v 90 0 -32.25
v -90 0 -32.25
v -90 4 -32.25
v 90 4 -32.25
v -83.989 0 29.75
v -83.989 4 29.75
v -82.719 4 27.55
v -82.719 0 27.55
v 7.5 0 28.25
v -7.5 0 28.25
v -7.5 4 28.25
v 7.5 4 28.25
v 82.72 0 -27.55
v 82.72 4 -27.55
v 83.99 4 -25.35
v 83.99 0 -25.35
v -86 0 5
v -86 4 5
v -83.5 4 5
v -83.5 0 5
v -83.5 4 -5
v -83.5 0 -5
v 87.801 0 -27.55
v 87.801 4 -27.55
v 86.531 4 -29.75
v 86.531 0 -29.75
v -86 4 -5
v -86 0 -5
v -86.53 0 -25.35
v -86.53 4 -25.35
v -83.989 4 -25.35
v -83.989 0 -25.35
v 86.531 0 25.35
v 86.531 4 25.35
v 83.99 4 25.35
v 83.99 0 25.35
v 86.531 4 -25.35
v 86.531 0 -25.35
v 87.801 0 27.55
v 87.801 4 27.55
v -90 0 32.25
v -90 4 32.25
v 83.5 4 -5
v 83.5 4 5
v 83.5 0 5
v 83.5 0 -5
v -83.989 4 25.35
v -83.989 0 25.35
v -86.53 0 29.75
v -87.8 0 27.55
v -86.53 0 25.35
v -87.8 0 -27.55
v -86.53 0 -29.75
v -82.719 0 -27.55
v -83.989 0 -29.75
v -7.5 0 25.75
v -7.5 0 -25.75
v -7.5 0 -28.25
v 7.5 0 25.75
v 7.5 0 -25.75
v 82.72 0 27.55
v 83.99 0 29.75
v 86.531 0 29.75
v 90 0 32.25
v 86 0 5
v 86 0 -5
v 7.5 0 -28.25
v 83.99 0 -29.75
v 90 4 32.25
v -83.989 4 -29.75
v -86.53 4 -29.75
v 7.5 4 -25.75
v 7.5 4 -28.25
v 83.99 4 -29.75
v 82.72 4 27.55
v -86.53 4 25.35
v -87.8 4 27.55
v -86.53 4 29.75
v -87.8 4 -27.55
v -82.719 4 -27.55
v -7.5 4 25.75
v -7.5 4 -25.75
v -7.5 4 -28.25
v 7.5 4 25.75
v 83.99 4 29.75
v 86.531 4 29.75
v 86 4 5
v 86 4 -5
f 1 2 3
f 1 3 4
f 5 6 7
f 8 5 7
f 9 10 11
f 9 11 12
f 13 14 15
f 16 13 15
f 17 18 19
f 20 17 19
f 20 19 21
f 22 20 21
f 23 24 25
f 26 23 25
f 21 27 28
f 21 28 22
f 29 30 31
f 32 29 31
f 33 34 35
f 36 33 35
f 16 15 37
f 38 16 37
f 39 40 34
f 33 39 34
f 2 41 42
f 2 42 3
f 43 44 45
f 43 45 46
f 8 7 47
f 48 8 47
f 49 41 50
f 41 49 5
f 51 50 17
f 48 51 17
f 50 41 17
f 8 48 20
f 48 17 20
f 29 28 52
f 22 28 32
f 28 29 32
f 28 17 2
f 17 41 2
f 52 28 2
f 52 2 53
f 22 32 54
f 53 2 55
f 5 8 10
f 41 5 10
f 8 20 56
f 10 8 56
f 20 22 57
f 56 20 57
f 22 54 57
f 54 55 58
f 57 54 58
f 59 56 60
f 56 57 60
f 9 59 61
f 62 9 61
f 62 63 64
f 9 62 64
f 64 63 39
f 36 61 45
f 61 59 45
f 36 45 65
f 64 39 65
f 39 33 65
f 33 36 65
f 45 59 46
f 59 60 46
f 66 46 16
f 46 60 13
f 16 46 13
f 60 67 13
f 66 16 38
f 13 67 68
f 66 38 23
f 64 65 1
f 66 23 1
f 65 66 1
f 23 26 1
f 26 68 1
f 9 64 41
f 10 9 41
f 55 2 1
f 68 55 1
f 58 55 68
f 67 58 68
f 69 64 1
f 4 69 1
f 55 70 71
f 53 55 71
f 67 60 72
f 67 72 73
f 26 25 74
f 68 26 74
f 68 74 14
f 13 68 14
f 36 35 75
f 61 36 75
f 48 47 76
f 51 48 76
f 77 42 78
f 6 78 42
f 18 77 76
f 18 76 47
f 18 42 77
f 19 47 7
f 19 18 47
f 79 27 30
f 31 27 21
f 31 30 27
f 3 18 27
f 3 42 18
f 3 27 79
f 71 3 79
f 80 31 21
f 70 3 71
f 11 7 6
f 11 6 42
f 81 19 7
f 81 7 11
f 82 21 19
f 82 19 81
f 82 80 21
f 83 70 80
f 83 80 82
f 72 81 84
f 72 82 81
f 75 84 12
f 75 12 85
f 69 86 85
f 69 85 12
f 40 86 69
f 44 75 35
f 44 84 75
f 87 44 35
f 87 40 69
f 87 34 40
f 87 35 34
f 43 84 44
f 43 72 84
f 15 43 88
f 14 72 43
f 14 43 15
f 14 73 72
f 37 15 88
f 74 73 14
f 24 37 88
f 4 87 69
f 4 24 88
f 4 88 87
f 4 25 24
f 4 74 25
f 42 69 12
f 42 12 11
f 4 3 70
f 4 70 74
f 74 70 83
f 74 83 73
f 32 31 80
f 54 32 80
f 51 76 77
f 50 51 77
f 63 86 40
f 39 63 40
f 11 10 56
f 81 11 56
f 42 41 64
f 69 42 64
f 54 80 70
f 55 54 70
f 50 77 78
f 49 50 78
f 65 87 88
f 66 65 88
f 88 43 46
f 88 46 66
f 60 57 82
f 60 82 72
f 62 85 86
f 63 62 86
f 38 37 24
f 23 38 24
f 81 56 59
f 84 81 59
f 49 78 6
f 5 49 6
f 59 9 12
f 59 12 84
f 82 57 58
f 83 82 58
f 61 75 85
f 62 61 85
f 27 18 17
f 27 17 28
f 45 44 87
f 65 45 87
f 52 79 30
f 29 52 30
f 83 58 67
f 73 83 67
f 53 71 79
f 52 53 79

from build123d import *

# Parameters (mm, degrees)
CROQUIS1_W              = 180
CROQUIS1_H              = 64.5
SALIENTE_EXTRUIR1_DEPTH = 4
CROQUIS2_W              = 2.5
CROQUIS2_H              = 10
CORTAR_EXTRUIR1_DEPTH   = 4
MATRIZL1_COUNT          = 2
MATRIZL1_PITCH          = 169.5
CROQUIS3_W              = 15
CROQUIS3_H              = 2.5
CORTAR_EXTRUIR2_DEPTH   = 4
CORTAR_EXTRUIR3_DEPTH   = 4
MATRIZL2_COUNT          = 2
MATRIZL2_PITCH          = 170.52
MATRIZL2_COUNT_DIR2     = 2
MATRIZL2_PITCH_DIR2     = 55.1


with BuildPart() as part:
    # Croquis1 → Saliente-Extruir1 (new body)
    with BuildSketch(Plane(origin=(0, 0, 0), x_dir=(1, 0, 0), z_dir=(0, 1, 0))):
        Rectangle(CROQUIS1_W, CROQUIS1_H)
    extrude(amount=SALIENTE_EXTRUIR1_DEPTH)

    # Croquis2 → Cortar-Extruir1 (cut)
    with BuildSketch(Plane(origin=(0, 4, 0), x_dir=(1, 0, 0), z_dir=(0, 1, 0))):
        with Locations((84.75, 0)):
            Rectangle(CROQUIS2_W, CROQUIS2_H)
    cortar_extruir1 = extrude(amount=-CORTAR_EXTRUIR1_DEPTH, mode=Mode.SUBTRACT)

    # MatrizL1: Cortar-Extruir1 ×2
    with Locations(*[(-i * MATRIZL1_PITCH, 0, 0) for i in range(1, MATRIZL1_COUNT)]):
        add(cortar_extruir1, mode=Mode.SUBTRACT)

    # Croquis3 → Cortar-Extruir2 (cut)
    with BuildSketch(Plane(origin=(0, 0, 0), x_dir=(1, 0, 0), z_dir=(0, 1, 0))):
        with Locations((0, 27)):
            Rectangle(CROQUIS3_W, CROQUIS3_H)
        with Locations((0, -27)):
            Rectangle(CROQUIS3_W, CROQUIS3_H)
    extrude(amount=CORTAR_EXTRUIR2_DEPTH, mode=Mode.SUBTRACT)

    # Croquis4 → Cortar-Extruir3 (cut)
    with BuildSketch(Plane(origin=(0, 4, 0), x_dir=(1, 0, 0), z_dir=(0, 1, 0))):
        Polygon((-82.719317631, 27.55), (-83.989488223, 29.75), (-86.529829408, 29.75), (-87.8, 27.55), (-86.529829408, 25.35), (-83.989488223, 25.35), align=None)
    cortar_extruir3 = extrude(amount=-CORTAR_EXTRUIR3_DEPTH, mode=Mode.SUBTRACT)

    # MatrizL2: Cortar-Extruir3 2 × 2
    with Locations(*[(i * MATRIZL2_PITCH, 0, j * MATRIZL2_PITCH_DIR2) for i in range(MATRIZL2_COUNT) for j in range(MATRIZL2_COUNT_DIR2) if (i, j) != (0, 0)]):
        add(cortar_extruir3, mode=Mode.SUBTRACT)


solid = part.part
